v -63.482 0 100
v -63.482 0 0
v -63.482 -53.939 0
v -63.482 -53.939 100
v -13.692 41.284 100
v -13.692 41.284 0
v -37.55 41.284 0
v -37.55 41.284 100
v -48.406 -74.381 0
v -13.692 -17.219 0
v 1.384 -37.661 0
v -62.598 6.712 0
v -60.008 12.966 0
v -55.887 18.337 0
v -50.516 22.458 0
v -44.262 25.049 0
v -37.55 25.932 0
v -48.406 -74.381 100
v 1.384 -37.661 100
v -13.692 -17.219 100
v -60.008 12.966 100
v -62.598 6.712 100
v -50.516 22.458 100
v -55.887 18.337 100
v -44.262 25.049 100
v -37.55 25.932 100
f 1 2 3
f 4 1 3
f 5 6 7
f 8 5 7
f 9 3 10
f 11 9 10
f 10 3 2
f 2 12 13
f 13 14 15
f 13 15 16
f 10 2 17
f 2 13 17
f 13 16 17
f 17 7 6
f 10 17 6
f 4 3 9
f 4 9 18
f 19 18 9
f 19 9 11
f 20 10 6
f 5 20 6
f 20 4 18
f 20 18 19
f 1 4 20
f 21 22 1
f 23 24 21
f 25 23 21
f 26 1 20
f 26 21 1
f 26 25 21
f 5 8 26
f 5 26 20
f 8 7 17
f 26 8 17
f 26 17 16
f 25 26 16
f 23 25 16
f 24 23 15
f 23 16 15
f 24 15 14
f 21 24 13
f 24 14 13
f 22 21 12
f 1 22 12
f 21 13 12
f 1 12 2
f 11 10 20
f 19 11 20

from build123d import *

# Parameters (mm, degrees)
F1_DEPTH = 100
F2_DEPTH = 25.4


with BuildPart() as f1:
    # F0 (on Top) → F1 (new body)
    with BuildSketch(Plane.XY):
        with BuildLine():
            Line((-63.4819120169, 0), (-63.4819120169, -53.9388507605))
            Line((-63.4819120169, -53.9388507605), (-13.6922001839, -17.2189325094))
            Line((-13.6922001839, -17.2189325094), (-13.6922001839, 41.2839800119))
            Line((-13.6922001839, 41.2839800119), (-37.5497788191, 41.2839800119))
            Line((-37.5497788191, 41.2839800119), (-37.5497788191, 25.9321331978))
            ThreePointArc((-37.5497788191, 25.9321331978), (-55.8865660539, 18.3367872348), (-63.4819120169, 0))
        make_face()
    extrude(amount=F1_DEPTH)

    # F2 (add): a face of the model
    f2_faces = [f1.faces().sort_by_distance(p)[0] for p in [
        (-38.5870561004, -35.5788916349, 50),
    ]]
    extrude(f2_faces, amount=F2_DEPTH)


solid = f1.part
